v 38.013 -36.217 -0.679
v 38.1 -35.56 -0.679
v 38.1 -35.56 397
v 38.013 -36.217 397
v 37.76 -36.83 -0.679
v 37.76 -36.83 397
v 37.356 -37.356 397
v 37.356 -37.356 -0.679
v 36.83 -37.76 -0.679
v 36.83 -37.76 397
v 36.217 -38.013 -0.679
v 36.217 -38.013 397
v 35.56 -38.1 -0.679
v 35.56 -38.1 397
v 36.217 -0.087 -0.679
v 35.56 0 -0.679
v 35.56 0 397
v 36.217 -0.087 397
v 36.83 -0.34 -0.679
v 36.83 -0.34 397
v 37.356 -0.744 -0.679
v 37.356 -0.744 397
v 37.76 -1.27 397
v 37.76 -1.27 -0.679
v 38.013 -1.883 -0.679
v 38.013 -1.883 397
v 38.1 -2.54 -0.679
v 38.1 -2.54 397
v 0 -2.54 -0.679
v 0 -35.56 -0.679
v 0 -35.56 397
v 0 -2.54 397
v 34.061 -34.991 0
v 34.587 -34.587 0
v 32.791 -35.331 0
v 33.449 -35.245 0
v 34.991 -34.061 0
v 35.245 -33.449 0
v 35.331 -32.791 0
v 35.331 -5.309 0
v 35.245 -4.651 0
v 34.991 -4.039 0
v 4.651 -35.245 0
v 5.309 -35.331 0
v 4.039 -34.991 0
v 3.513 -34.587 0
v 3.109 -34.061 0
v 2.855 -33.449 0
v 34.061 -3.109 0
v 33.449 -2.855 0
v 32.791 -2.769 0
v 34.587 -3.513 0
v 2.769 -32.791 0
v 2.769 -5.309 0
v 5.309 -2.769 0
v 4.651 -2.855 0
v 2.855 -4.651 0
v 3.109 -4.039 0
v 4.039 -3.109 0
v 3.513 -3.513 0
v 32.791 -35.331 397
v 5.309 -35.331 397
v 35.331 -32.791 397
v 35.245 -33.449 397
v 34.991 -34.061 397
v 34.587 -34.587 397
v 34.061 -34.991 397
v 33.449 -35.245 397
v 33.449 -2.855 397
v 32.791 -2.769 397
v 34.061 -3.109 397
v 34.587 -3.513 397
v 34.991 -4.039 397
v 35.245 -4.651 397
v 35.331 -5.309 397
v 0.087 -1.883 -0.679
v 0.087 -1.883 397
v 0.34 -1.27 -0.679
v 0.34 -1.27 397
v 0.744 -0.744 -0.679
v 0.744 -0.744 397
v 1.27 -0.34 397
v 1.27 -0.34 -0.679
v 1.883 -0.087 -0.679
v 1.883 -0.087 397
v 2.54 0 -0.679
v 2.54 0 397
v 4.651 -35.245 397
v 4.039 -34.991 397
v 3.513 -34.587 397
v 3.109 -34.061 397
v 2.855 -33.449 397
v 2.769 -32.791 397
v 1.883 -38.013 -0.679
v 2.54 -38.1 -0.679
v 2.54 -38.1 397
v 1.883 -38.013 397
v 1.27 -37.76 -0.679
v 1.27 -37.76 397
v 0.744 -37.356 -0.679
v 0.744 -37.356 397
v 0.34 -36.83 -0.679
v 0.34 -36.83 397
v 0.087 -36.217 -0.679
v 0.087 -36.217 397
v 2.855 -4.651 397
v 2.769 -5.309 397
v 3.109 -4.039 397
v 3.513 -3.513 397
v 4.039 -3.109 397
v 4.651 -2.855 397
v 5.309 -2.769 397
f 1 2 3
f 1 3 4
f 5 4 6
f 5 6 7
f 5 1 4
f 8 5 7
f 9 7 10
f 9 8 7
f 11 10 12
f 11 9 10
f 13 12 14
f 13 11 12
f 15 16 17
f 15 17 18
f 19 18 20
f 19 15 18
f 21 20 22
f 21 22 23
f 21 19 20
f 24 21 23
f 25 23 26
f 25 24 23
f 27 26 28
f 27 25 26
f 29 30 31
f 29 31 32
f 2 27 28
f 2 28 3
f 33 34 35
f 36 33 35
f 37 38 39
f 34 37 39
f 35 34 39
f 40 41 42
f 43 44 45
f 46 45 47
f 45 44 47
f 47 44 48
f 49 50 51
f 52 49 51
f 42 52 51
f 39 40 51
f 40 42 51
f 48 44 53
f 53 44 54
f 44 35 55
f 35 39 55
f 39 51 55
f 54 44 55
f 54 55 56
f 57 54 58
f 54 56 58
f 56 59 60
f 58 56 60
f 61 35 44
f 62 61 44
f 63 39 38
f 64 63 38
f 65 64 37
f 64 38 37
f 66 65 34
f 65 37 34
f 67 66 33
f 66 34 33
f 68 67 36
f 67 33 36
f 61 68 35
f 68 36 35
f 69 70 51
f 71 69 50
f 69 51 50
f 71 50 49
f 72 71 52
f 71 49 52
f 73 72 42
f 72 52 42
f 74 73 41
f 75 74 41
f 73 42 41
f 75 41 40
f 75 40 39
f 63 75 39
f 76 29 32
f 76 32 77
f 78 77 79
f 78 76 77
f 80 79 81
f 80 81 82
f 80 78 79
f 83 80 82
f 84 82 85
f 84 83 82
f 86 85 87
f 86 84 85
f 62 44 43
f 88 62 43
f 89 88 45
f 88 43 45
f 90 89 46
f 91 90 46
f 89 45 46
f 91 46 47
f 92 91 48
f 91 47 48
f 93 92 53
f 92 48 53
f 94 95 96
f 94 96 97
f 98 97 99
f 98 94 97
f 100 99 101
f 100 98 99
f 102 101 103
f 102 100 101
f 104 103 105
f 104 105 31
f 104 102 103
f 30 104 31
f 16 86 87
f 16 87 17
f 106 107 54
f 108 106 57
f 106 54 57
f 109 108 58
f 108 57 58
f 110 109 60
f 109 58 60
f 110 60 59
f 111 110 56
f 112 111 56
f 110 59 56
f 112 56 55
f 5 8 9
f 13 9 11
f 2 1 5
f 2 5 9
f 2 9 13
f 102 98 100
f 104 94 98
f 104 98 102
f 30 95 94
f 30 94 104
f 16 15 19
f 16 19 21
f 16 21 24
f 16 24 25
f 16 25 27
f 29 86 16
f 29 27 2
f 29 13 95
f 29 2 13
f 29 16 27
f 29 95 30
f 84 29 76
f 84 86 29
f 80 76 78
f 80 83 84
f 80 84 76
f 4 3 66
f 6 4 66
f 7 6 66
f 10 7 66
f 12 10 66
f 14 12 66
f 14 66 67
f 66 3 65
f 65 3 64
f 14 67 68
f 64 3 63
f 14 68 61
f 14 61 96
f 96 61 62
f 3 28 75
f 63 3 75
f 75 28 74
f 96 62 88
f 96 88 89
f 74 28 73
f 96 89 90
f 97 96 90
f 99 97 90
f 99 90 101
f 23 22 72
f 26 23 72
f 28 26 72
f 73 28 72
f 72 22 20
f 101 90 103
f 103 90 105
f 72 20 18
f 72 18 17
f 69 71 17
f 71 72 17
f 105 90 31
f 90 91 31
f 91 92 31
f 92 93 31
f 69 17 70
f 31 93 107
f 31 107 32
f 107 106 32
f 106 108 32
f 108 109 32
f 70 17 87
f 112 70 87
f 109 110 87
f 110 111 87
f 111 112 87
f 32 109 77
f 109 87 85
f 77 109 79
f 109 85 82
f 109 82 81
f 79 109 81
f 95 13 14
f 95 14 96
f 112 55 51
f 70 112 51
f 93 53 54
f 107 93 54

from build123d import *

# Parameters (mm, degrees)
BOSS_EXTRUDE1_DEPTH = 397
BOSS_EXTRUDE2_START = 0.678713738
BOSS_EXTRUDE2_DEPTH = 0.678713738


with BuildPart() as part:
    # Sketch1 → Boss-Extrude1 (new body)
    with BuildSketch(Plane.XY):
        with BuildLine():
            Line((2.54, 0), (35.56, 0))
            ThreePointArc((35.56, 0), (37.356051224, -0.743948776), (38.1, -2.54))
            Line((38.1, -2.54), (38.1, -35.56))
            ThreePointArc((38.1, -35.56), (37.356051224, -37.356051224), (35.56, -38.1))
            Line((35.56, -38.1), (2.54, -38.1))
            ThreePointArc((2.54, -38.1), (0.743948776, -37.356051224), (0, -35.56))
            Line((0, -35.56), (0, -2.54))
            ThreePointArc((0, -2.54), (0.743948776, -0.743948776), (2.54, 0))
        make_face()
        with BuildLine():
            Line((5.3086, -2.7686), (32.7914, -2.7686))
            ThreePointArc((32.7914, -2.7686), (34.587451224, -3.512548776), (35.3314, -5.3086))
            Line((35.3314, -5.3086), (35.3314, -32.7914))
            ThreePointArc((35.3314, -32.7914), (34.587451224, -34.587451224), (32.7914, -35.3314))
            Line((32.7914, -35.3314), (5.3086, -35.3314))
            ThreePointArc((5.3086, -35.3314), (3.512548776, -34.587451224), (2.7686, -32.7914))
            Line((2.7686, -32.7914), (2.7686, -5.3086))
            ThreePointArc((2.7686, -5.3086), (3.512548776, -3.512548776), (5.3086, -2.7686))
        make_face(mode=Mode.SUBTRACT)
    extrude(amount=BOSS_EXTRUDE1_DEPTH)

    # Sketch2 → Boss-Extrude2 (add)
    with BuildSketch(Plane(origin=(0, 0, 0), x_dir=(-1, 0, 0), z_dir=(0, 0, -1)).offset(BOSS_EXTRUDE2_START)):
        with BuildLine():
            Line((0, -35.56), (0, -2.54))
            ThreePointArc((0, -2.54), (-0.743948776, -0.743948776), (-2.54, 0))
            Line((-2.54, 0), (-35.56, 0))
            ThreePointArc((-35.56, 0), (-37.356051224, -0.743948776), (-38.1, -2.54))
            Line((-38.1, -2.54), (-38.1, -35.56))
            ThreePointArc((-38.1, -35.56), (-37.356051224, -37.356051224), (-35.56, -38.1))
            Line((-35.56, -38.1), (-2.54, -38.1))
            ThreePointArc((-2.54, -38.1), (-0.743948776, -37.356051224), (0, -35.56))
        make_face()
    extrude(amount=-BOSS_EXTRUDE2_DEPTH)


solid = part.part
